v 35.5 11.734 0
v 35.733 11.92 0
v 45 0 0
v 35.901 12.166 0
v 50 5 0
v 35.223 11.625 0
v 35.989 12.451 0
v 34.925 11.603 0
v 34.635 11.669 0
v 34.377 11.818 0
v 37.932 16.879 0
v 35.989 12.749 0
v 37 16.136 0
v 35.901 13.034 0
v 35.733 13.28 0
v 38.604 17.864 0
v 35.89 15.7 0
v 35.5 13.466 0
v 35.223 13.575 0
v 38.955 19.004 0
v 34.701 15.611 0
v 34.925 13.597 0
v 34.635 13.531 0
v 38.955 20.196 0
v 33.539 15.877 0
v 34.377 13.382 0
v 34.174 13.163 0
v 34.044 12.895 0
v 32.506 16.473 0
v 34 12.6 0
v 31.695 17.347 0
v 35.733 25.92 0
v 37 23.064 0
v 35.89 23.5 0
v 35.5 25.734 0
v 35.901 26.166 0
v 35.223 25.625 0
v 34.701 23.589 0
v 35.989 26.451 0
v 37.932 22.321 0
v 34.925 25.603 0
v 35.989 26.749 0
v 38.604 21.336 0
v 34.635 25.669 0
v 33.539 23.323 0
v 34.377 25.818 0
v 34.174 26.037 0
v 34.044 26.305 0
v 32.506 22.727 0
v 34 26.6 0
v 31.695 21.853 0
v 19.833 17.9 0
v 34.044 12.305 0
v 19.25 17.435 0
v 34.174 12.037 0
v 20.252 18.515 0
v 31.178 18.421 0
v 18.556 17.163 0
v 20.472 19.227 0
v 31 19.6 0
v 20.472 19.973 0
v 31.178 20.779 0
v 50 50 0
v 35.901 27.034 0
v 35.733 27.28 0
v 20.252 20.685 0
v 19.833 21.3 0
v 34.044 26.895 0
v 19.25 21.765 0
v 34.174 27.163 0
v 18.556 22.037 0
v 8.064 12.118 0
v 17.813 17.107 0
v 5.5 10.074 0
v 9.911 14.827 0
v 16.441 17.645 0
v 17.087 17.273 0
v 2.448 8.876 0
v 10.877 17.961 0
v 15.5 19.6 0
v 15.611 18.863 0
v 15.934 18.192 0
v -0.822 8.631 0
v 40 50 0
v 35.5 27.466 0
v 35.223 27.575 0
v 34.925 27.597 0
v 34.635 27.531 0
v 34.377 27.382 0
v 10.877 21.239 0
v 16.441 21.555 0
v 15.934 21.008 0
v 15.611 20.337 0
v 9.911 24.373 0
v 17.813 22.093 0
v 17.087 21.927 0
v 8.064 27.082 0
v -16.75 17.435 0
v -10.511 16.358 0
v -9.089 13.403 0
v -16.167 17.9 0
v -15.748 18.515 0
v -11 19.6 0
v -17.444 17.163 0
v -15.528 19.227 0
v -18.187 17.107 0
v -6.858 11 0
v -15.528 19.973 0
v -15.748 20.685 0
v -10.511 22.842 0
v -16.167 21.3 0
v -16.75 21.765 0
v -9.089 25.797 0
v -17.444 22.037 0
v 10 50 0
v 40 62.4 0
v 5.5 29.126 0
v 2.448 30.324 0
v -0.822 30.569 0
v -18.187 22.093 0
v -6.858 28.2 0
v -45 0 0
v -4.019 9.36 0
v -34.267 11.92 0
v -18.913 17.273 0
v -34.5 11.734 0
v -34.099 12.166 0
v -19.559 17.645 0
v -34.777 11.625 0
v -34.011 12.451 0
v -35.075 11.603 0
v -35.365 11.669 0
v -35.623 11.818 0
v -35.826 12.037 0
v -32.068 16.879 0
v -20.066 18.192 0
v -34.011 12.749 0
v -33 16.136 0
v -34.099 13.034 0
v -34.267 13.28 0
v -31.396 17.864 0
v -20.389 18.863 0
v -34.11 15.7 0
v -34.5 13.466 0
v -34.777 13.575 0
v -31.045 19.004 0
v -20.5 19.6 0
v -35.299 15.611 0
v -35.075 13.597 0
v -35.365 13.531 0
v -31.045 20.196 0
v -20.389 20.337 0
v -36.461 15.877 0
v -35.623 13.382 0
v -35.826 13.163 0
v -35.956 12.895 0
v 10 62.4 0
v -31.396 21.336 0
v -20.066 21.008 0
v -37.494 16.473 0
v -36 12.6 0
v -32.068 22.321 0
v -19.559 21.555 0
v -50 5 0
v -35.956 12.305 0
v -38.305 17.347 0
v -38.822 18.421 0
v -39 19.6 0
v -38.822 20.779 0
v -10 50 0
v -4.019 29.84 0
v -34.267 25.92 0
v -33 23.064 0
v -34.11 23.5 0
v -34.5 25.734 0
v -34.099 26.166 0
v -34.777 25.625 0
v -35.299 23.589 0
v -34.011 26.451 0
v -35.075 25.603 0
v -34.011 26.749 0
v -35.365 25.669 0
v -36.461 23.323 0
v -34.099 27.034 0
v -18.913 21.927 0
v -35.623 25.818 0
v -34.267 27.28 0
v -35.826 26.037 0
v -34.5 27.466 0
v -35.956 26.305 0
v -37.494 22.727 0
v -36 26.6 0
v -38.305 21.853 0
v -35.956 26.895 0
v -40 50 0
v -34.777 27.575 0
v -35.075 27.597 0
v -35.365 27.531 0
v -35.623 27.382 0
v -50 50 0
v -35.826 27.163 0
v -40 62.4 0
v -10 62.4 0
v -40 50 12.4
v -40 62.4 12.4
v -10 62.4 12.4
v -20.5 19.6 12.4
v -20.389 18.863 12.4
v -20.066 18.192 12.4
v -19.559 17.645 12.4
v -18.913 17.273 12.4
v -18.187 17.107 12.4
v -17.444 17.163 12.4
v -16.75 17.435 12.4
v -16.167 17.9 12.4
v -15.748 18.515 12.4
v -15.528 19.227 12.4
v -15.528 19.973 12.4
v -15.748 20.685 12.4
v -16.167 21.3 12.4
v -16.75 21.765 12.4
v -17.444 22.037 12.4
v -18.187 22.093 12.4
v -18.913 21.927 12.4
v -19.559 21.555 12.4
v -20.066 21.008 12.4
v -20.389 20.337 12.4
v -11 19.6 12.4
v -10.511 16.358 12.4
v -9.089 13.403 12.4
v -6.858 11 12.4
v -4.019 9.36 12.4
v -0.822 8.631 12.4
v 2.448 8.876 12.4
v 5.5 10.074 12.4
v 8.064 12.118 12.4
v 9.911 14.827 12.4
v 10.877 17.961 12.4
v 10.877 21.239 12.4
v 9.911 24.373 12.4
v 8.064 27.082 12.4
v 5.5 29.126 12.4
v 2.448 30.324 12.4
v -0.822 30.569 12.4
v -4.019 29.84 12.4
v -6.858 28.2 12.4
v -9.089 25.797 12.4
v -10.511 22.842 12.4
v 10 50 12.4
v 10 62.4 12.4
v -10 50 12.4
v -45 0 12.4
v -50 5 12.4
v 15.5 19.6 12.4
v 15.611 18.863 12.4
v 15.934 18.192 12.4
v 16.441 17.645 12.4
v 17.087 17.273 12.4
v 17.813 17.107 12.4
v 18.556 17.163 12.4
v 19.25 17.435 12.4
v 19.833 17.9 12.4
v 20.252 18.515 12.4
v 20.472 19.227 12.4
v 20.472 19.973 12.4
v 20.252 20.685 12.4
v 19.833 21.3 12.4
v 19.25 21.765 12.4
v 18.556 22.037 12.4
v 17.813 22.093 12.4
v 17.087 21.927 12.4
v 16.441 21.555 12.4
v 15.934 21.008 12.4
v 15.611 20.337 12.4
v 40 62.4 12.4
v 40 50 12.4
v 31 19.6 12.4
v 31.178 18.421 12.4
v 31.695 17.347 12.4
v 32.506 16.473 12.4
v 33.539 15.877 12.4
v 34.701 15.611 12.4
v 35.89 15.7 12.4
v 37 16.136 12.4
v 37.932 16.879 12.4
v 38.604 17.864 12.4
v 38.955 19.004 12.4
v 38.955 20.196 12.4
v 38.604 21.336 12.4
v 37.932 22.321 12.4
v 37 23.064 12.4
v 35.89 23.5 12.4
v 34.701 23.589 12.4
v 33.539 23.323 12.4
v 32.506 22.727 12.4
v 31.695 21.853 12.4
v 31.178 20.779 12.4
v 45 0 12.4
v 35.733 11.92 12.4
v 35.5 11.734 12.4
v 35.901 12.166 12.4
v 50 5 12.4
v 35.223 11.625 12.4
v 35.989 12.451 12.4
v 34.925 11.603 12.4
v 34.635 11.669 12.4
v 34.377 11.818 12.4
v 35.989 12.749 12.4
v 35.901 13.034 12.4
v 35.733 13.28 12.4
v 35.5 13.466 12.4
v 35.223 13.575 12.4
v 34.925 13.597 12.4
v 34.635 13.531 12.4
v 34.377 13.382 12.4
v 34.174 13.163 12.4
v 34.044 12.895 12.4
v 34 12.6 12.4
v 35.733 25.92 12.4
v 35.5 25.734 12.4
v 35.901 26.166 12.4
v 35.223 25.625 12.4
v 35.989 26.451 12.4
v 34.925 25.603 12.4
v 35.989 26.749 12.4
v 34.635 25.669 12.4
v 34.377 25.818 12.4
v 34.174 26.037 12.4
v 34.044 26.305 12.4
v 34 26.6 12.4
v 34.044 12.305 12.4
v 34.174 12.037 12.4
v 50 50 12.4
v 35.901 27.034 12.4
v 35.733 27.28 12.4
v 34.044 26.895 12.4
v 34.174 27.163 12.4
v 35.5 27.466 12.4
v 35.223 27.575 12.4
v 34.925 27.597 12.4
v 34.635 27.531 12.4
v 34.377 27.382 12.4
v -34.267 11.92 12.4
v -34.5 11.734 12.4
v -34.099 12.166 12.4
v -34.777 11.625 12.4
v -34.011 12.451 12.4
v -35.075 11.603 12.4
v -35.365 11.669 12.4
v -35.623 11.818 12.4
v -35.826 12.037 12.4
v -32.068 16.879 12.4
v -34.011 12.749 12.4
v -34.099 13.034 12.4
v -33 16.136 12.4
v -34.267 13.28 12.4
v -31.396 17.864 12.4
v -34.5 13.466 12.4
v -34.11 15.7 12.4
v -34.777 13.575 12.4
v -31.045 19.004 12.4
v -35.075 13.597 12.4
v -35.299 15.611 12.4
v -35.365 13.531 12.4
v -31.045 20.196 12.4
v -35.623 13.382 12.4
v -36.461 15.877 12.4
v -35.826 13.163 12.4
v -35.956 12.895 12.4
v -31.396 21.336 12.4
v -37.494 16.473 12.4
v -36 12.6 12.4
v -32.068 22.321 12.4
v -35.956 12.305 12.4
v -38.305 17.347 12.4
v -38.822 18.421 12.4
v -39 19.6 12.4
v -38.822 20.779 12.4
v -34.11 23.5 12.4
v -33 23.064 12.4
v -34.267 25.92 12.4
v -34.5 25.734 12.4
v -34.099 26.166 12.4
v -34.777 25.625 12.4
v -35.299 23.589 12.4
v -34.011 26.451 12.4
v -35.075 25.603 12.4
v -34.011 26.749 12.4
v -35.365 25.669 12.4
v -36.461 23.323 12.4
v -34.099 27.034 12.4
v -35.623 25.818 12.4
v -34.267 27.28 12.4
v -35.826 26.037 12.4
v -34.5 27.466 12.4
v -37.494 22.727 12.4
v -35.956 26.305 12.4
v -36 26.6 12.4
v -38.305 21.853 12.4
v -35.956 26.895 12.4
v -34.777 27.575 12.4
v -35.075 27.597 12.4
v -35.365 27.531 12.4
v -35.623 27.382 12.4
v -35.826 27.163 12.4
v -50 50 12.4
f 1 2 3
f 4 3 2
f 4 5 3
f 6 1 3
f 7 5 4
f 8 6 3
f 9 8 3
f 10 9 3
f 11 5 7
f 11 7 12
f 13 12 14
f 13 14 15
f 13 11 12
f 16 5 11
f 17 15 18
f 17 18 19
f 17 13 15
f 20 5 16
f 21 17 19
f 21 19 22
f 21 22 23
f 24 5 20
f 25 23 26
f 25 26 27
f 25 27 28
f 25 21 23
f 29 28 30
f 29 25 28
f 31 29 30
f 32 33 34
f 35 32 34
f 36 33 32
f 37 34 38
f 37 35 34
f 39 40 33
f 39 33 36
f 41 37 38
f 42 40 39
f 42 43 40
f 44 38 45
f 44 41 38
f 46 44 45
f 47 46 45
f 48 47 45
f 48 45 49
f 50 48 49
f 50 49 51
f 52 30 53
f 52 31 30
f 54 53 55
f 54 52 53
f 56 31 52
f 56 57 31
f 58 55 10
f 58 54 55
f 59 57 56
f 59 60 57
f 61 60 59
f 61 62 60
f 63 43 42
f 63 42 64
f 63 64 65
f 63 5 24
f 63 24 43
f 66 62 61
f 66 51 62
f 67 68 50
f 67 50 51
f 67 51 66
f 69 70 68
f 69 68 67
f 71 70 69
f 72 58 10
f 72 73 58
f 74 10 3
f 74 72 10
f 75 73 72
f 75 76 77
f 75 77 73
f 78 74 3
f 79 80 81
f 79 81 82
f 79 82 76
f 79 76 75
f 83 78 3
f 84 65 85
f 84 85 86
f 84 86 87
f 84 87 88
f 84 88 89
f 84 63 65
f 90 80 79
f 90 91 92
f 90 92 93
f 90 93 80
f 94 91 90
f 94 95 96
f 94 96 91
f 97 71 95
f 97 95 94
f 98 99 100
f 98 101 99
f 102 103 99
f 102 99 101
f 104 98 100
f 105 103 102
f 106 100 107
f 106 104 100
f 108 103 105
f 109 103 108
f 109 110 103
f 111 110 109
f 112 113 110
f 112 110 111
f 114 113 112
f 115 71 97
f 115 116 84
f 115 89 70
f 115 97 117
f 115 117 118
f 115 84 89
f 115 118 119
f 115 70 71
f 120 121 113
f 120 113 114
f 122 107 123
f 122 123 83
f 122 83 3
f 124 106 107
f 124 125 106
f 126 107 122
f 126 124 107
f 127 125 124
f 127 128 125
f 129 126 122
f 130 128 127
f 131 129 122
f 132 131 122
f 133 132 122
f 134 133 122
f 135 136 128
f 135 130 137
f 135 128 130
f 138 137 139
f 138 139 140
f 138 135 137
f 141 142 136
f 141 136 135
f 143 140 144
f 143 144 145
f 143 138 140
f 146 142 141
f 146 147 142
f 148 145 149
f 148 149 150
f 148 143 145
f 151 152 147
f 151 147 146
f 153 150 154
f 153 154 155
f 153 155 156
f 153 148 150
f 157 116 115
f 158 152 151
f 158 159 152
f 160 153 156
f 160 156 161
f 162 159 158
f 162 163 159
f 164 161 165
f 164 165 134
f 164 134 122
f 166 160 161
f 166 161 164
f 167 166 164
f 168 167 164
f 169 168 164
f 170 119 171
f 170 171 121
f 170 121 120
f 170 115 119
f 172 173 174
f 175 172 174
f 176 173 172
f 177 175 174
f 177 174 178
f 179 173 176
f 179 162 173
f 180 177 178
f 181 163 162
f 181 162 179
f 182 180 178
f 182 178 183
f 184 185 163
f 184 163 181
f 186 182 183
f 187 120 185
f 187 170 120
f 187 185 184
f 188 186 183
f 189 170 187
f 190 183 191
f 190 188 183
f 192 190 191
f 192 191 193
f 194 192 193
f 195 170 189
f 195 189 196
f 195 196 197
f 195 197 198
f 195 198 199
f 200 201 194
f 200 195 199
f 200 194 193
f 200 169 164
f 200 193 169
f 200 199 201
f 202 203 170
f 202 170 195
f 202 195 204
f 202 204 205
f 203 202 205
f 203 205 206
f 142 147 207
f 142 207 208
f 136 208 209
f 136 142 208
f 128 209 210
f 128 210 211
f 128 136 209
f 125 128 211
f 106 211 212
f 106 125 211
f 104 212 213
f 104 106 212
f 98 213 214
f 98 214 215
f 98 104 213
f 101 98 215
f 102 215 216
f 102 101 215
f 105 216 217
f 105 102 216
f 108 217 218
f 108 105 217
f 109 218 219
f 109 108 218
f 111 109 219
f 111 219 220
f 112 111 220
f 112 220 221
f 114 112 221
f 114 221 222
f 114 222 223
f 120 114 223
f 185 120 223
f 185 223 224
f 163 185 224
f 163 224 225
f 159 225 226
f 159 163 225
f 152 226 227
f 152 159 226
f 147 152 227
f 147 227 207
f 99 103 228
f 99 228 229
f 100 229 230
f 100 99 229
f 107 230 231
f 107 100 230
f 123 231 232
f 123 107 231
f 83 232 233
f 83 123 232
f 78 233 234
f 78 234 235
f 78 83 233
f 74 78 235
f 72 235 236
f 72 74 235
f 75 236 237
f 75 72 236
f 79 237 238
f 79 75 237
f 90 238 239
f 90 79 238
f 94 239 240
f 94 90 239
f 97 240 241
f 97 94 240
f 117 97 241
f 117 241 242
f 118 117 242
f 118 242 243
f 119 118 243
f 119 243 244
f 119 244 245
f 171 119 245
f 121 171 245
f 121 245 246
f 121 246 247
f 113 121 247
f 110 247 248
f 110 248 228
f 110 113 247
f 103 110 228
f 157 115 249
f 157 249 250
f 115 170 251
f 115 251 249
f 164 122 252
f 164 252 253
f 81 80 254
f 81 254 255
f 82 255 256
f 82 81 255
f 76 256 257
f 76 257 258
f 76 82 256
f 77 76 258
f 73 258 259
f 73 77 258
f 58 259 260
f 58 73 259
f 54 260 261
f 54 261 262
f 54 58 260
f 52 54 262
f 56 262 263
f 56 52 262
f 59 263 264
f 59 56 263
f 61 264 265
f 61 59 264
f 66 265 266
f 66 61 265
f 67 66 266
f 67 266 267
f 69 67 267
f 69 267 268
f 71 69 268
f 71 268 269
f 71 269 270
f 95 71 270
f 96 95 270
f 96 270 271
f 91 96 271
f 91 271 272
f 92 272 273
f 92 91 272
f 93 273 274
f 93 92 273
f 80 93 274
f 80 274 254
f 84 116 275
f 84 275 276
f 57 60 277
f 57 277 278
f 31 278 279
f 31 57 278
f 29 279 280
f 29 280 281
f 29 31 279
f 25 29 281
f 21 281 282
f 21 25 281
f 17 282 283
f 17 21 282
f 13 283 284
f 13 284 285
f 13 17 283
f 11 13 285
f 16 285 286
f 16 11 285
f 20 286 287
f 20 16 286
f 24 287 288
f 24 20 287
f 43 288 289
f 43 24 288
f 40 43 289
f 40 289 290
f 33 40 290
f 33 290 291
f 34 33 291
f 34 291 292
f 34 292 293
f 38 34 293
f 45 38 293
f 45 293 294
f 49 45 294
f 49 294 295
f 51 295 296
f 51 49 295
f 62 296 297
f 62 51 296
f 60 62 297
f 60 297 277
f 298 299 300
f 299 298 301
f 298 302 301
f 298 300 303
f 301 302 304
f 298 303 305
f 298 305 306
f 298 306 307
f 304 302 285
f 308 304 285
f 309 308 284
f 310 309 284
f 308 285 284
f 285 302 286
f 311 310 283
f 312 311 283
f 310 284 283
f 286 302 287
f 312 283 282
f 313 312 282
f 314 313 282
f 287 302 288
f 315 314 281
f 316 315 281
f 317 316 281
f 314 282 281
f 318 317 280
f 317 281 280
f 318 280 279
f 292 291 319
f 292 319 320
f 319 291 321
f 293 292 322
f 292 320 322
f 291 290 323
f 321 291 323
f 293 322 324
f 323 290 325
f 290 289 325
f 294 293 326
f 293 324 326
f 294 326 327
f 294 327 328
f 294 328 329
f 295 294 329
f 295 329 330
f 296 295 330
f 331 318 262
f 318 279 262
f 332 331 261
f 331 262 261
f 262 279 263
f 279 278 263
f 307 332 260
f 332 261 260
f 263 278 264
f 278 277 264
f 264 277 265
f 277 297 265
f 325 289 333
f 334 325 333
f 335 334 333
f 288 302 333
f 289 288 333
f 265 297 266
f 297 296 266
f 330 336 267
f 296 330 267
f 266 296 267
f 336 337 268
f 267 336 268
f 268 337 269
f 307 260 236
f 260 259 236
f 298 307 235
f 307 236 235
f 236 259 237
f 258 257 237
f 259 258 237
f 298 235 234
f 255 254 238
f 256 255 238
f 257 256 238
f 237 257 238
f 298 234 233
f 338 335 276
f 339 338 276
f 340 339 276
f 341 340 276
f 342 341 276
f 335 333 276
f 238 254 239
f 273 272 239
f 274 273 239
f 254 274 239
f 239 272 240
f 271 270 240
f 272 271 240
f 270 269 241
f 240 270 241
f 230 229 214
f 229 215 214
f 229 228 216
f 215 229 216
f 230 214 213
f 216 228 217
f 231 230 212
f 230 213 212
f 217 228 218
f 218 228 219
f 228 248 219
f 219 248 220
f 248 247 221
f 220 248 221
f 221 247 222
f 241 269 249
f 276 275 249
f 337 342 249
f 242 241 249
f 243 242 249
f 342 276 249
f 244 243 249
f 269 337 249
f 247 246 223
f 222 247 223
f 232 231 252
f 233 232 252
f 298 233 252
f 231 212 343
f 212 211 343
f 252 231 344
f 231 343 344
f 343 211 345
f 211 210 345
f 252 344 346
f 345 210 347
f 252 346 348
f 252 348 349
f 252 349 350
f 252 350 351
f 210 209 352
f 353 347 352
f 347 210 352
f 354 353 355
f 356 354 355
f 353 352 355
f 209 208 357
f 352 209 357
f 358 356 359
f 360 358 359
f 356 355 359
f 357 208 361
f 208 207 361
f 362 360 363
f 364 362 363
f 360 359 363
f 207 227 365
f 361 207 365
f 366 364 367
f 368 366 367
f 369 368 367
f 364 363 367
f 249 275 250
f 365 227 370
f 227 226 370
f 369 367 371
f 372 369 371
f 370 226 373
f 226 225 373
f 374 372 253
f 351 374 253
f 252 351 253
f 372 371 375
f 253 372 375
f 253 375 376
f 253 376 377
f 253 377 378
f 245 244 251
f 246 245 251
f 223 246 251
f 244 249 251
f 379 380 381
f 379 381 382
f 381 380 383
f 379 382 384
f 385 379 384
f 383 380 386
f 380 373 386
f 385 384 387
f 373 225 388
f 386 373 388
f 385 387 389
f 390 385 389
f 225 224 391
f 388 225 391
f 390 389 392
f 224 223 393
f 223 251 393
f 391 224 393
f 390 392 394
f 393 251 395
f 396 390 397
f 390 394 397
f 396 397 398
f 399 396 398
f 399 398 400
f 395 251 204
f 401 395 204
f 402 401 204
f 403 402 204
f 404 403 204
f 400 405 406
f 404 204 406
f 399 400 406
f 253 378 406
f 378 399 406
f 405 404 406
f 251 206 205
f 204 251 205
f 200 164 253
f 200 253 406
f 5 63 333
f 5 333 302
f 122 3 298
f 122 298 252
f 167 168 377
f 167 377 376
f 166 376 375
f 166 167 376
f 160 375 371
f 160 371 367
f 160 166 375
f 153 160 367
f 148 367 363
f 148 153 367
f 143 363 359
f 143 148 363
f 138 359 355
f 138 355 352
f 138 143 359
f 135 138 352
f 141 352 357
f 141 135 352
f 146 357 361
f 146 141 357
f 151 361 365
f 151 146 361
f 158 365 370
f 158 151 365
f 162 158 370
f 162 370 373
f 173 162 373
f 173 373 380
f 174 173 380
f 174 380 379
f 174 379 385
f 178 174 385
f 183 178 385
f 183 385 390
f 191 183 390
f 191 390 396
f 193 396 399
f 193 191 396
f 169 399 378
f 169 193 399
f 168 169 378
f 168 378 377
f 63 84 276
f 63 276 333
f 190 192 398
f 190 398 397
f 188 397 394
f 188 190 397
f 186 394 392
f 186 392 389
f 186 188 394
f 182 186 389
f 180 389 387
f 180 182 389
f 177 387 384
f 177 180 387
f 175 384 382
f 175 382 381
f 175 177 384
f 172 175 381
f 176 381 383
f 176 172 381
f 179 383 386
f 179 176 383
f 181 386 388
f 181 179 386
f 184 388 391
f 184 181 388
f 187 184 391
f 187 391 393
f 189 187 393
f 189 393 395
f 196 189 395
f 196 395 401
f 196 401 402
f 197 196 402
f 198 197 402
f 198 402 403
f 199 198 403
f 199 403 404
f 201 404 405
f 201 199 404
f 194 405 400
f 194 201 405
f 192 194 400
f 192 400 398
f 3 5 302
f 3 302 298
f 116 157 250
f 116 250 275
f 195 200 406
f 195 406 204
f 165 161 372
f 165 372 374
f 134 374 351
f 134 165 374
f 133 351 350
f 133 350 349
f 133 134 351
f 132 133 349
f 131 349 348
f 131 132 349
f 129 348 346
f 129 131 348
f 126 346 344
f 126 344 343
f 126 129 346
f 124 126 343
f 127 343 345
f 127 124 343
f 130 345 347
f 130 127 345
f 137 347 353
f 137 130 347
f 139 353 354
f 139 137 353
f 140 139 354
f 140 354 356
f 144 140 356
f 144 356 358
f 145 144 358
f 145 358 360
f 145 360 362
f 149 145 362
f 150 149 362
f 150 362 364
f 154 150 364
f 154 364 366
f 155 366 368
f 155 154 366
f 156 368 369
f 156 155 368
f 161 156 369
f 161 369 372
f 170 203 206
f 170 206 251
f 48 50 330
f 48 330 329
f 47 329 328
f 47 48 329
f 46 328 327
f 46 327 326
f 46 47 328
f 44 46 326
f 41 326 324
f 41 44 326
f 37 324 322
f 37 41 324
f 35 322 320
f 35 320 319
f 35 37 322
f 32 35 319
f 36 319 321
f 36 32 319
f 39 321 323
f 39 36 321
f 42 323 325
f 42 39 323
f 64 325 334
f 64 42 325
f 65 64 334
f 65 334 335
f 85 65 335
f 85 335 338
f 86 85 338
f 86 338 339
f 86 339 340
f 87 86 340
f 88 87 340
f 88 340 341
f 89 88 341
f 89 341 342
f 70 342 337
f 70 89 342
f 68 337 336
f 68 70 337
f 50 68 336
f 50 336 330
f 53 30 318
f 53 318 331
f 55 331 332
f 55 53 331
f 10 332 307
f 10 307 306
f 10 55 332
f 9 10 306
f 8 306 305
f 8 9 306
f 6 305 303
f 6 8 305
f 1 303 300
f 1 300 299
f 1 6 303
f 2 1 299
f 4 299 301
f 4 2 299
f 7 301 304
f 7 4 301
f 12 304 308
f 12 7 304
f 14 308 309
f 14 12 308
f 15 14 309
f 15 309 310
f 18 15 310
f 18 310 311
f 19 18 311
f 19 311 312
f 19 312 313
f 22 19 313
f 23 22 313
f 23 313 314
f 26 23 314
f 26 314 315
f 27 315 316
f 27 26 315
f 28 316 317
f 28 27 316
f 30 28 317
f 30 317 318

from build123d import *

# Parameters (mm, degrees)
MODEL_R             = 11
MODEL_R_2           = 4
MODEL_R_3           = 1
MODEL_R_4           = 2.5
BOSS_EXTRUDE1_DEPTH = 12.4


with BuildPart() as part:
    # Model → Boss-Extrude1 (new body)
    with BuildSketch(Plane.XY):
        Polygon((-45, 0), (-50, 5), (-50, 50), (-40, 50), (-40, 62.4), (-10, 62.4), (-10, 50), (10, 50), (10, 62.4), (40, 62.4), (40, 50), (50, 50), (50, 5), (45, 0), align=None)
        with Locations(Location((0, 19.6, 0), (0, 0, 180))):
            Circle(MODEL_R, mode=Mode.SUBTRACT)
        with Locations(Location((-35, 19.6, 0), (0, 0, 180))):
            Circle(MODEL_R_2, mode=Mode.SUBTRACT)
        with Locations(Location((35, 19.6, 0), (0, 0, 180))):
            Circle(MODEL_R_2, mode=Mode.SUBTRACT)
        with Locations(Location((-35, 26.6, 0), (0, 0, 180))):
            Circle(MODEL_R_3, mode=Mode.SUBTRACT)
        with Locations(Location((-35, 12.6, 0), (0, 0, 180))):
            Circle(MODEL_R_3, mode=Mode.SUBTRACT)
        with Locations(Location((35, 12.6, 0), (0, 0, 180))):
            Circle(MODEL_R_3, mode=Mode.SUBTRACT)
        with Locations(Location((35, 26.6, 0), (0, 0, 180))):
            Circle(MODEL_R_3, mode=Mode.SUBTRACT)
        with Locations(Location((-18, 19.6, 0), (0, 0, 180))):
            Circle(MODEL_R_4, mode=Mode.SUBTRACT)
        with Locations(Location((18, 19.6, 0), (0, 0, 180))):
            Circle(MODEL_R_4, mode=Mode.SUBTRACT)
    extrude(amount=BOSS_EXTRUDE1_DEPTH)


solid = part.part
